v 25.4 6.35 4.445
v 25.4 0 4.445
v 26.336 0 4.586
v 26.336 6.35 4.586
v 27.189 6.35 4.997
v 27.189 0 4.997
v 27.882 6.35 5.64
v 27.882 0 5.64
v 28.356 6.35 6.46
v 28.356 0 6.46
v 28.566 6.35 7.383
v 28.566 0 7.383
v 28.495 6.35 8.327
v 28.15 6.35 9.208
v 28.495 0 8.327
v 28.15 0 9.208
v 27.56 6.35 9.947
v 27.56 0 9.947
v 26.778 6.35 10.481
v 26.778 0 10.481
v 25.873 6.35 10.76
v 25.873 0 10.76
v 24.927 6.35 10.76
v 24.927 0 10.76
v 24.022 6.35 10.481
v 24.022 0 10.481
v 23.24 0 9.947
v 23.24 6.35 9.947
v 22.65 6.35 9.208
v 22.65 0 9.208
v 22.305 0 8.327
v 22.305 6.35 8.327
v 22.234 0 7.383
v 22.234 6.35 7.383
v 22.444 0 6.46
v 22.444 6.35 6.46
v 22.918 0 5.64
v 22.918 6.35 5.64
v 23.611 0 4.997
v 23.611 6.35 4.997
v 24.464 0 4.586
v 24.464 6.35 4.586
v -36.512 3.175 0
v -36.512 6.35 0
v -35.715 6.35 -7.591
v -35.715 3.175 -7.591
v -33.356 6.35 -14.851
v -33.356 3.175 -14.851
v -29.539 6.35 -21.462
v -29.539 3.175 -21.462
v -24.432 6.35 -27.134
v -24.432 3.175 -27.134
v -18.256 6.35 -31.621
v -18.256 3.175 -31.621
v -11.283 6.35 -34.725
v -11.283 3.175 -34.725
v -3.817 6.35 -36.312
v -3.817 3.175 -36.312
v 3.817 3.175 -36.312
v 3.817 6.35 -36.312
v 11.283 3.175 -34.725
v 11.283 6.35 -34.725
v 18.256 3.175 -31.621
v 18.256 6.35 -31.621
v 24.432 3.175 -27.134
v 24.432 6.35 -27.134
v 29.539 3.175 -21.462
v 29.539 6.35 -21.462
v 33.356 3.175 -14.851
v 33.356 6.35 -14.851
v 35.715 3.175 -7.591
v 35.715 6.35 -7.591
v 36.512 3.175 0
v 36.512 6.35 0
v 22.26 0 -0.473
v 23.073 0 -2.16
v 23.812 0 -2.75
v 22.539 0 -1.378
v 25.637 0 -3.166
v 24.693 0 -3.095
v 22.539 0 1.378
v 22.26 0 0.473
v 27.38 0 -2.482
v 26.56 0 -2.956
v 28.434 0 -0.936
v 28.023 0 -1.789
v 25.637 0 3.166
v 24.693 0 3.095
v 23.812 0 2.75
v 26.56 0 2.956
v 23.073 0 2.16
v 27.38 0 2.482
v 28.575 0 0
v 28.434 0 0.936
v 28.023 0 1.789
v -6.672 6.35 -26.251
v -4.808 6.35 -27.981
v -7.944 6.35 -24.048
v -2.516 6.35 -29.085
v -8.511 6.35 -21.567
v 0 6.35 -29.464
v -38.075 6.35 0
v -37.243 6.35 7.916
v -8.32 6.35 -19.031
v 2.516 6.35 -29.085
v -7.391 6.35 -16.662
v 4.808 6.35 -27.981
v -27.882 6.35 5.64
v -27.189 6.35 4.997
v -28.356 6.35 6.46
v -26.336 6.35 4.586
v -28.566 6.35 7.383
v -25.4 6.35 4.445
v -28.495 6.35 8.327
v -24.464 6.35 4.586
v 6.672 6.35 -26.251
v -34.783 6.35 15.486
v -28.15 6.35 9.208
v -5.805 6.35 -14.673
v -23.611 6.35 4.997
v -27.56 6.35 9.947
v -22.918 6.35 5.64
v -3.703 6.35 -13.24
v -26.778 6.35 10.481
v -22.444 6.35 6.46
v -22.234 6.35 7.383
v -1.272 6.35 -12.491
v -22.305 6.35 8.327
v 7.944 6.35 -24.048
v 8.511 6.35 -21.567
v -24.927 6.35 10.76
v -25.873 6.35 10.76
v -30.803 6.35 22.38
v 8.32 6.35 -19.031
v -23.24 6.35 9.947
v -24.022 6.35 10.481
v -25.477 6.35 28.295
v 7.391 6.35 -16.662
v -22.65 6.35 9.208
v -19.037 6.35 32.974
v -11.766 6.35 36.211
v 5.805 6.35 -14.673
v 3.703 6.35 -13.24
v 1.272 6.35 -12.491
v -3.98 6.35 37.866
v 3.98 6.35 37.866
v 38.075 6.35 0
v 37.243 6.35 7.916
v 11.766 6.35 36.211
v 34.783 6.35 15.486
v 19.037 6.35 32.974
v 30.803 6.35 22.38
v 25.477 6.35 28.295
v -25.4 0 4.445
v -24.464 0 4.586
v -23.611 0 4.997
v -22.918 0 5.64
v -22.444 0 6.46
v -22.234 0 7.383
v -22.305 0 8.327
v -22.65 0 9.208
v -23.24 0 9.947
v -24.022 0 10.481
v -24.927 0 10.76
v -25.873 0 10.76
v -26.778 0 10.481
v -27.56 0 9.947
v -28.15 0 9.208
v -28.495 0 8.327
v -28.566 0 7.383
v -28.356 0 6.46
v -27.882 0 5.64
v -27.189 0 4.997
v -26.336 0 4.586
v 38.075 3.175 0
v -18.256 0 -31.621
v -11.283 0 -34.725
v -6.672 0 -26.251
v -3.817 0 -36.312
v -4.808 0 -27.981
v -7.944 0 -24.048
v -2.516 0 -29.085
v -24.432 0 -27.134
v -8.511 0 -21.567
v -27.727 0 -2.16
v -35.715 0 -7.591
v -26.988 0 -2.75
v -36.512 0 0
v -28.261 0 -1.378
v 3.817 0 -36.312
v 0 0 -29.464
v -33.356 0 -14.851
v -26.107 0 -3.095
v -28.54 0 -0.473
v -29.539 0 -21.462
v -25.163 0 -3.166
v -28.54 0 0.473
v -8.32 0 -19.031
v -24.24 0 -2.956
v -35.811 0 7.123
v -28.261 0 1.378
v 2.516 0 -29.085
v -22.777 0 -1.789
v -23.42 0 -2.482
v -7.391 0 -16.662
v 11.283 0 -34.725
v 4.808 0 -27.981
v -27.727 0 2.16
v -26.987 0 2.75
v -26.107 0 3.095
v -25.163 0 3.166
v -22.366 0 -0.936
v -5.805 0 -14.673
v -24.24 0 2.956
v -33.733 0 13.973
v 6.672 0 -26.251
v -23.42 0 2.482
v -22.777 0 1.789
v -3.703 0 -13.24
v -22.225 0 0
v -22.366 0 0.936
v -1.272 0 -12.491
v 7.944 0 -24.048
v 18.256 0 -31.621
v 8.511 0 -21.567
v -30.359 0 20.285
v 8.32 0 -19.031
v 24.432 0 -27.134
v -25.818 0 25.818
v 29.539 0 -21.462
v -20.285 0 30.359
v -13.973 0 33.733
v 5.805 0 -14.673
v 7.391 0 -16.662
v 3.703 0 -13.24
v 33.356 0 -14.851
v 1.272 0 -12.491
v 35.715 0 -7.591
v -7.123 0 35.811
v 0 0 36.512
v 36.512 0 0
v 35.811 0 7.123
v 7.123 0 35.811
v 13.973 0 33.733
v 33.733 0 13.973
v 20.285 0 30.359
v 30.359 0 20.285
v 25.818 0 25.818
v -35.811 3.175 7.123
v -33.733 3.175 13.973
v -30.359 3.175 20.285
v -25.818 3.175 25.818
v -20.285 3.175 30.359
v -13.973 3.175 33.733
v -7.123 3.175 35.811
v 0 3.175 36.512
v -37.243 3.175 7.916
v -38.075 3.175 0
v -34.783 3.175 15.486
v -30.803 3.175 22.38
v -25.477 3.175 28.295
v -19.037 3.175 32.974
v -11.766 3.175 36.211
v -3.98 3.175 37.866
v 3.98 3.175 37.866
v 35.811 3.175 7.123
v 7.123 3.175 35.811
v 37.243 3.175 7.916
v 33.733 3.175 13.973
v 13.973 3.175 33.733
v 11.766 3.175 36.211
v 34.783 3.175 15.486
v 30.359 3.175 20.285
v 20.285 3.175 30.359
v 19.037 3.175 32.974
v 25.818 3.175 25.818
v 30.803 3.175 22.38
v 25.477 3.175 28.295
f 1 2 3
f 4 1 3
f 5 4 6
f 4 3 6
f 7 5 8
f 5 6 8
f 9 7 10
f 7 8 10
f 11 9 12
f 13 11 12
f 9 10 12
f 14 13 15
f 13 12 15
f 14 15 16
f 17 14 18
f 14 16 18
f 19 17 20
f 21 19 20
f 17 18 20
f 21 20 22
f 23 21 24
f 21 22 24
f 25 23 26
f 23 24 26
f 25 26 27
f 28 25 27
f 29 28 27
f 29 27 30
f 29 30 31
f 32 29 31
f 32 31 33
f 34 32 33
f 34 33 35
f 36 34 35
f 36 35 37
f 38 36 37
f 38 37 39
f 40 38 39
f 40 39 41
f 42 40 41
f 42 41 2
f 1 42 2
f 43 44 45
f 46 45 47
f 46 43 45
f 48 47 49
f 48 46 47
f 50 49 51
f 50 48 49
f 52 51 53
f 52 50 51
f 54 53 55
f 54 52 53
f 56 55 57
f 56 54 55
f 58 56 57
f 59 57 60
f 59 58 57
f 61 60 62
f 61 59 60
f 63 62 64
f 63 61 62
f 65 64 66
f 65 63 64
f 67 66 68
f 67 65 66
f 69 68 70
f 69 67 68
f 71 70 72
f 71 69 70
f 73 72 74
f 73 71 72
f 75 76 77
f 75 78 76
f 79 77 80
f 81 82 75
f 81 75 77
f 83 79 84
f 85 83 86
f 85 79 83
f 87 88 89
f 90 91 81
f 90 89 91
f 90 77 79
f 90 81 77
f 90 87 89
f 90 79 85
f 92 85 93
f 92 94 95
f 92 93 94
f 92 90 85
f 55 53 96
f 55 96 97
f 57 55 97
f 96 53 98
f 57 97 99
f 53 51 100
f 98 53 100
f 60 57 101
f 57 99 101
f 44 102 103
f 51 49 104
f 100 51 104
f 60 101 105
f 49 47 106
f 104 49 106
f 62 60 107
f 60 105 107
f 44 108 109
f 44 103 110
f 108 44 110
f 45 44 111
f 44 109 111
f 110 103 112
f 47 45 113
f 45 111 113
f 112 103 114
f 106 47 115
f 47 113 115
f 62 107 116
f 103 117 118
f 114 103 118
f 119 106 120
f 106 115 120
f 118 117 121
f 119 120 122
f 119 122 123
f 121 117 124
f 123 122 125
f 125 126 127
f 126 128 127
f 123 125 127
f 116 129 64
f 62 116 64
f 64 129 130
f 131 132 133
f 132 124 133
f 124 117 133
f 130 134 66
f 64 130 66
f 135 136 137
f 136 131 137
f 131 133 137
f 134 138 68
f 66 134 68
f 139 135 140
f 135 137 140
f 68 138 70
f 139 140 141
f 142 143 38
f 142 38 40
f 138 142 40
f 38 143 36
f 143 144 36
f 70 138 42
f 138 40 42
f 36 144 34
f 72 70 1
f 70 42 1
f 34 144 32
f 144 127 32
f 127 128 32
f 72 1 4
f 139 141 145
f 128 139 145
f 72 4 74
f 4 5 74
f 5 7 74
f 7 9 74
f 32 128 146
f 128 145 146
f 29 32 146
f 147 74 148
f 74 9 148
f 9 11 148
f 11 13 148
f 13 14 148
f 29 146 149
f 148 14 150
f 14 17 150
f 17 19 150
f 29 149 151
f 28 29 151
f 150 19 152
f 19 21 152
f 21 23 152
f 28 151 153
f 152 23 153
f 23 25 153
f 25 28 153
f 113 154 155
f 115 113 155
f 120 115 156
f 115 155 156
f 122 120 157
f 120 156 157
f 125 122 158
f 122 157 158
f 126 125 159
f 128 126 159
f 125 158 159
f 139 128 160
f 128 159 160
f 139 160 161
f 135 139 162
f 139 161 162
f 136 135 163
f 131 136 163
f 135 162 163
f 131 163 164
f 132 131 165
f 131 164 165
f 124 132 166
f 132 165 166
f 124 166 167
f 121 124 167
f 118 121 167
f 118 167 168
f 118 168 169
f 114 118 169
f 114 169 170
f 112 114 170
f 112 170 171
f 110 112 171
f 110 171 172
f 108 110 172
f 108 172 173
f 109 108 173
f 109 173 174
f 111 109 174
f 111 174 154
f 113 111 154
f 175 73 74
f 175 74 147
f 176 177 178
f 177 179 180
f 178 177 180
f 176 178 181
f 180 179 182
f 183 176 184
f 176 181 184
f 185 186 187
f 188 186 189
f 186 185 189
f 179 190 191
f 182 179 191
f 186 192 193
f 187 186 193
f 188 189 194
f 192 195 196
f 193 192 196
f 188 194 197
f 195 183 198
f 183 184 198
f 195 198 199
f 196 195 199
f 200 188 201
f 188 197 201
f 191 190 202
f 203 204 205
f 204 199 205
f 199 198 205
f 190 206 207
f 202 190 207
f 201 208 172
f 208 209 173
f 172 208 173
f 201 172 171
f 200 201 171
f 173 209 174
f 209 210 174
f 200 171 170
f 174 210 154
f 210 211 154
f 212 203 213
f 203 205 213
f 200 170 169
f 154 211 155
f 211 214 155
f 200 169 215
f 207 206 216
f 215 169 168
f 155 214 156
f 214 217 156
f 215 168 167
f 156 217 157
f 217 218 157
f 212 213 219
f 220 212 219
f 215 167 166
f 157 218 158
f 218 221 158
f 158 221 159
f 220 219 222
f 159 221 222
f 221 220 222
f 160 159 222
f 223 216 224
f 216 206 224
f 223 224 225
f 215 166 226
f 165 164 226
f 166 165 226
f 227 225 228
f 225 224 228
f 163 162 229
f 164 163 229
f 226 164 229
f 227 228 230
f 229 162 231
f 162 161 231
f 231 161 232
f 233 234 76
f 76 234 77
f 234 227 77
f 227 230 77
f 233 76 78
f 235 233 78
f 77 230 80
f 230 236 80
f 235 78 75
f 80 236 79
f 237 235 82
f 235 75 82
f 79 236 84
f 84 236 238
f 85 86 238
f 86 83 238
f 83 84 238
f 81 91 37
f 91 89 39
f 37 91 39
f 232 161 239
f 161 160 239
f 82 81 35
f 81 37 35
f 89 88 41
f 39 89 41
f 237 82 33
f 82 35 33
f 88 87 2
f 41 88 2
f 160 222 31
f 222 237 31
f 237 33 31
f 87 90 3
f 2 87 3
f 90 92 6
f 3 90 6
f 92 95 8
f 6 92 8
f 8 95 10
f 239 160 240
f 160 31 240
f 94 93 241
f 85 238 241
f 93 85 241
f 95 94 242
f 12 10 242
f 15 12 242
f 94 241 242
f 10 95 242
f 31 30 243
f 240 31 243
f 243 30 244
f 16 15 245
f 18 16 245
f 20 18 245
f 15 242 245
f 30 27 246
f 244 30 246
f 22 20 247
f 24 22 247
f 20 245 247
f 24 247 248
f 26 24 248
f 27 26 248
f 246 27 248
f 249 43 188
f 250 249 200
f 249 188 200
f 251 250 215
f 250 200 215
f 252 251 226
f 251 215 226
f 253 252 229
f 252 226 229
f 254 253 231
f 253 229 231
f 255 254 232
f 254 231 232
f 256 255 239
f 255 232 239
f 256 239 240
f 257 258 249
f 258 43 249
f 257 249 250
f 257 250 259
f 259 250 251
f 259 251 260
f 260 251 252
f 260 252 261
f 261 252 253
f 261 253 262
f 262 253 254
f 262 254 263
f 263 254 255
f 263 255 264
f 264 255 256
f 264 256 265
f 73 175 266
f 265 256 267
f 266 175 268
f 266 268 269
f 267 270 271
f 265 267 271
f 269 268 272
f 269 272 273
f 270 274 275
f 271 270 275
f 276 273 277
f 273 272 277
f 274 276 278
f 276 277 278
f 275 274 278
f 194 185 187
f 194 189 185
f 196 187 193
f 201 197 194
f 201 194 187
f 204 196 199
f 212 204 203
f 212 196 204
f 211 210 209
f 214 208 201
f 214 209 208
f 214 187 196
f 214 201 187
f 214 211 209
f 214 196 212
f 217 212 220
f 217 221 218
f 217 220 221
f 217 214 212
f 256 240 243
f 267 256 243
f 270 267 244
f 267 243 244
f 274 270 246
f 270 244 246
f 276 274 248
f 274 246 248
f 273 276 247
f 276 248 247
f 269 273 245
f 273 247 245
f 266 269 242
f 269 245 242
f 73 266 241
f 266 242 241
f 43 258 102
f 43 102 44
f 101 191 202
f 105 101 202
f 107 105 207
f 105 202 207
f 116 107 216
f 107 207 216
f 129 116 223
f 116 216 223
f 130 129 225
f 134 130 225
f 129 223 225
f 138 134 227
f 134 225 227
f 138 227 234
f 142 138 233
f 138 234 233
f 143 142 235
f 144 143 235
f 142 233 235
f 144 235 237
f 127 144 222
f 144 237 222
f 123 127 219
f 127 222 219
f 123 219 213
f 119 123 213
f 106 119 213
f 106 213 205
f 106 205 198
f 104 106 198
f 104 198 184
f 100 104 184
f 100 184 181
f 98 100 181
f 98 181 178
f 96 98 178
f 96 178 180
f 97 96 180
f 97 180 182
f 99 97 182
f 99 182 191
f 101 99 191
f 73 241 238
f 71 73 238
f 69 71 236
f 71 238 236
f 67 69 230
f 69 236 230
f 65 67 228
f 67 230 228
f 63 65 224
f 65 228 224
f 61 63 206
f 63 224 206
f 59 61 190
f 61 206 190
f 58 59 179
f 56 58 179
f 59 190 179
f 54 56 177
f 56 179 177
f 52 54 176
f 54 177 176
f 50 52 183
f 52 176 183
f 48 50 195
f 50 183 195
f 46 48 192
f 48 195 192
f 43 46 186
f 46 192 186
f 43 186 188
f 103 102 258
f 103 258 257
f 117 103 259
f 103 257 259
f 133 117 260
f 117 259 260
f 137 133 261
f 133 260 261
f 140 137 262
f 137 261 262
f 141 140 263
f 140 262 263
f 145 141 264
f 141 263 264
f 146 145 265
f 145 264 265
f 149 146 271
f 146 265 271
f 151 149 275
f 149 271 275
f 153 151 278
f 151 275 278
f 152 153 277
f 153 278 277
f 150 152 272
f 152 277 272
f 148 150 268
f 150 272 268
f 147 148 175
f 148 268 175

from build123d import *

# Parameters (mm, degrees)
SKETCH1_R           = 36.5125
BOSS_EXTRUDE1_DEPTH = 3.175
SKETCH2_R           = 38.0746
BOSS_EXTRUDE2_DEPTH = 3.175
SKETCH3_R           = 5.08
CUT_EXTRUDE1_DEPTH  = 55.218749804
SKETCH7_R           = 3.175
CUT_EXTRUDE4_DEPTH  = 55.218749804
SKETCH8_R           = 8.5344
CUT_EXTRUDE5_DEPTH  = 55.218749804
BOSS_EXTRUDE3_START = -6.35
SKETCH9_R           = 3.175
BOSS_EXTRUDE3_DEPTH = 6.35
SKETCH10_R          = 3.175
CUT_EXTRUDE6_DEPTH  = 55.218749804


with BuildPart() as part:
    # Sketch1 → Boss-Extrude1 (new body)
    with BuildSketch(Plane(origin=(0, 0, 0), x_dir=(1, 0, 0), z_dir=(0, 1, 0))):
        with Locations(Location((0, 0, 0), (0, 0, 270))):
            Circle(SKETCH1_R)
    extrude(amount=BOSS_EXTRUDE1_DEPTH)

    # Sketch2 → Boss-Extrude2 (add)
    with BuildSketch(Plane(origin=(0, 3.175, 0), x_dir=(1, 0, 0), z_dir=(0, 1, 0))):
        with Locations(Location((0, 0, 0), (0, 0, 270))):
            Circle(SKETCH2_R)
    extrude(amount=BOSS_EXTRUDE2_DEPTH)

    # Sketch3 → Cut-Extrude1 (cut, through all)
    with BuildSketch(Plane.XZ):
        with Locations(Location((0, -20.9296, 0), (0, 0, 270))):
            Circle(SKETCH3_R)
    extrude(amount=-CUT_EXTRUDE1_DEPTH, mode=Mode.SUBTRACT)

    # Sketch7 → Cut-Extrude4 (cut, through all)
    with BuildSketch(Plane(origin=(0, 6.35, 0), x_dir=(1, 0, 0), z_dir=(0, 1, 0))):
        with Locations(Location((-25.4, 0, 0), (0, 0, 270))):
            Circle(SKETCH7_R)
        with Locations(Location((25.4, 0, 0), (0, 0, 270))):
            Circle(SKETCH7_R)
    extrude(amount=-CUT_EXTRUDE4_DEPTH, mode=Mode.SUBTRACT)

    # Sketch8 → Cut-Extrude5 (cut, through all)
    with BuildSketch(Plane.XZ):
        with Locations(Location((0, -20.9296, 0), (0, 0, 270))):
            Circle(SKETCH8_R)
        with BuildLine():
            Line((-38.0746, 0), (-36.5125, 0))
            ThreePointArc((-36.5125, 0), (0, -36.5125), (36.5125, 0))
            Line((36.5125, 0), (38.0746, 0))
            ThreePointArc((38.0746, 0), (0, -38.0746), (-38.0746, 0))
        make_face()
    extrude(amount=-CUT_EXTRUDE5_DEPTH, mode=Mode.SUBTRACT)

    # Sketch9 → Boss-Extrude3 (add)
    with BuildSketch(Plane.XZ.offset(BOSS_EXTRUDE3_START)):
        with Locations((-25.4, 0)):
            Circle(SKETCH9_R)
        with Locations((25.4, 0)):
            Circle(SKETCH9_R)
    extrude(amount=BOSS_EXTRUDE3_DEPTH)

    # Sketch10 → Cut-Extrude6 (cut, through all)
    with BuildSketch(Plane.XZ):
        with Locations(Location((-25.4, 7.62, 0), (0, 0, 270))):
            Circle(SKETCH10_R)
        with Locations(Location((25.4, 7.62, 0), (0, 0, 270))):
            Circle(SKETCH10_R)
    extrude(amount=-CUT_EXTRUDE6_DEPTH, mode=Mode.SUBTRACT)


solid = part.part
